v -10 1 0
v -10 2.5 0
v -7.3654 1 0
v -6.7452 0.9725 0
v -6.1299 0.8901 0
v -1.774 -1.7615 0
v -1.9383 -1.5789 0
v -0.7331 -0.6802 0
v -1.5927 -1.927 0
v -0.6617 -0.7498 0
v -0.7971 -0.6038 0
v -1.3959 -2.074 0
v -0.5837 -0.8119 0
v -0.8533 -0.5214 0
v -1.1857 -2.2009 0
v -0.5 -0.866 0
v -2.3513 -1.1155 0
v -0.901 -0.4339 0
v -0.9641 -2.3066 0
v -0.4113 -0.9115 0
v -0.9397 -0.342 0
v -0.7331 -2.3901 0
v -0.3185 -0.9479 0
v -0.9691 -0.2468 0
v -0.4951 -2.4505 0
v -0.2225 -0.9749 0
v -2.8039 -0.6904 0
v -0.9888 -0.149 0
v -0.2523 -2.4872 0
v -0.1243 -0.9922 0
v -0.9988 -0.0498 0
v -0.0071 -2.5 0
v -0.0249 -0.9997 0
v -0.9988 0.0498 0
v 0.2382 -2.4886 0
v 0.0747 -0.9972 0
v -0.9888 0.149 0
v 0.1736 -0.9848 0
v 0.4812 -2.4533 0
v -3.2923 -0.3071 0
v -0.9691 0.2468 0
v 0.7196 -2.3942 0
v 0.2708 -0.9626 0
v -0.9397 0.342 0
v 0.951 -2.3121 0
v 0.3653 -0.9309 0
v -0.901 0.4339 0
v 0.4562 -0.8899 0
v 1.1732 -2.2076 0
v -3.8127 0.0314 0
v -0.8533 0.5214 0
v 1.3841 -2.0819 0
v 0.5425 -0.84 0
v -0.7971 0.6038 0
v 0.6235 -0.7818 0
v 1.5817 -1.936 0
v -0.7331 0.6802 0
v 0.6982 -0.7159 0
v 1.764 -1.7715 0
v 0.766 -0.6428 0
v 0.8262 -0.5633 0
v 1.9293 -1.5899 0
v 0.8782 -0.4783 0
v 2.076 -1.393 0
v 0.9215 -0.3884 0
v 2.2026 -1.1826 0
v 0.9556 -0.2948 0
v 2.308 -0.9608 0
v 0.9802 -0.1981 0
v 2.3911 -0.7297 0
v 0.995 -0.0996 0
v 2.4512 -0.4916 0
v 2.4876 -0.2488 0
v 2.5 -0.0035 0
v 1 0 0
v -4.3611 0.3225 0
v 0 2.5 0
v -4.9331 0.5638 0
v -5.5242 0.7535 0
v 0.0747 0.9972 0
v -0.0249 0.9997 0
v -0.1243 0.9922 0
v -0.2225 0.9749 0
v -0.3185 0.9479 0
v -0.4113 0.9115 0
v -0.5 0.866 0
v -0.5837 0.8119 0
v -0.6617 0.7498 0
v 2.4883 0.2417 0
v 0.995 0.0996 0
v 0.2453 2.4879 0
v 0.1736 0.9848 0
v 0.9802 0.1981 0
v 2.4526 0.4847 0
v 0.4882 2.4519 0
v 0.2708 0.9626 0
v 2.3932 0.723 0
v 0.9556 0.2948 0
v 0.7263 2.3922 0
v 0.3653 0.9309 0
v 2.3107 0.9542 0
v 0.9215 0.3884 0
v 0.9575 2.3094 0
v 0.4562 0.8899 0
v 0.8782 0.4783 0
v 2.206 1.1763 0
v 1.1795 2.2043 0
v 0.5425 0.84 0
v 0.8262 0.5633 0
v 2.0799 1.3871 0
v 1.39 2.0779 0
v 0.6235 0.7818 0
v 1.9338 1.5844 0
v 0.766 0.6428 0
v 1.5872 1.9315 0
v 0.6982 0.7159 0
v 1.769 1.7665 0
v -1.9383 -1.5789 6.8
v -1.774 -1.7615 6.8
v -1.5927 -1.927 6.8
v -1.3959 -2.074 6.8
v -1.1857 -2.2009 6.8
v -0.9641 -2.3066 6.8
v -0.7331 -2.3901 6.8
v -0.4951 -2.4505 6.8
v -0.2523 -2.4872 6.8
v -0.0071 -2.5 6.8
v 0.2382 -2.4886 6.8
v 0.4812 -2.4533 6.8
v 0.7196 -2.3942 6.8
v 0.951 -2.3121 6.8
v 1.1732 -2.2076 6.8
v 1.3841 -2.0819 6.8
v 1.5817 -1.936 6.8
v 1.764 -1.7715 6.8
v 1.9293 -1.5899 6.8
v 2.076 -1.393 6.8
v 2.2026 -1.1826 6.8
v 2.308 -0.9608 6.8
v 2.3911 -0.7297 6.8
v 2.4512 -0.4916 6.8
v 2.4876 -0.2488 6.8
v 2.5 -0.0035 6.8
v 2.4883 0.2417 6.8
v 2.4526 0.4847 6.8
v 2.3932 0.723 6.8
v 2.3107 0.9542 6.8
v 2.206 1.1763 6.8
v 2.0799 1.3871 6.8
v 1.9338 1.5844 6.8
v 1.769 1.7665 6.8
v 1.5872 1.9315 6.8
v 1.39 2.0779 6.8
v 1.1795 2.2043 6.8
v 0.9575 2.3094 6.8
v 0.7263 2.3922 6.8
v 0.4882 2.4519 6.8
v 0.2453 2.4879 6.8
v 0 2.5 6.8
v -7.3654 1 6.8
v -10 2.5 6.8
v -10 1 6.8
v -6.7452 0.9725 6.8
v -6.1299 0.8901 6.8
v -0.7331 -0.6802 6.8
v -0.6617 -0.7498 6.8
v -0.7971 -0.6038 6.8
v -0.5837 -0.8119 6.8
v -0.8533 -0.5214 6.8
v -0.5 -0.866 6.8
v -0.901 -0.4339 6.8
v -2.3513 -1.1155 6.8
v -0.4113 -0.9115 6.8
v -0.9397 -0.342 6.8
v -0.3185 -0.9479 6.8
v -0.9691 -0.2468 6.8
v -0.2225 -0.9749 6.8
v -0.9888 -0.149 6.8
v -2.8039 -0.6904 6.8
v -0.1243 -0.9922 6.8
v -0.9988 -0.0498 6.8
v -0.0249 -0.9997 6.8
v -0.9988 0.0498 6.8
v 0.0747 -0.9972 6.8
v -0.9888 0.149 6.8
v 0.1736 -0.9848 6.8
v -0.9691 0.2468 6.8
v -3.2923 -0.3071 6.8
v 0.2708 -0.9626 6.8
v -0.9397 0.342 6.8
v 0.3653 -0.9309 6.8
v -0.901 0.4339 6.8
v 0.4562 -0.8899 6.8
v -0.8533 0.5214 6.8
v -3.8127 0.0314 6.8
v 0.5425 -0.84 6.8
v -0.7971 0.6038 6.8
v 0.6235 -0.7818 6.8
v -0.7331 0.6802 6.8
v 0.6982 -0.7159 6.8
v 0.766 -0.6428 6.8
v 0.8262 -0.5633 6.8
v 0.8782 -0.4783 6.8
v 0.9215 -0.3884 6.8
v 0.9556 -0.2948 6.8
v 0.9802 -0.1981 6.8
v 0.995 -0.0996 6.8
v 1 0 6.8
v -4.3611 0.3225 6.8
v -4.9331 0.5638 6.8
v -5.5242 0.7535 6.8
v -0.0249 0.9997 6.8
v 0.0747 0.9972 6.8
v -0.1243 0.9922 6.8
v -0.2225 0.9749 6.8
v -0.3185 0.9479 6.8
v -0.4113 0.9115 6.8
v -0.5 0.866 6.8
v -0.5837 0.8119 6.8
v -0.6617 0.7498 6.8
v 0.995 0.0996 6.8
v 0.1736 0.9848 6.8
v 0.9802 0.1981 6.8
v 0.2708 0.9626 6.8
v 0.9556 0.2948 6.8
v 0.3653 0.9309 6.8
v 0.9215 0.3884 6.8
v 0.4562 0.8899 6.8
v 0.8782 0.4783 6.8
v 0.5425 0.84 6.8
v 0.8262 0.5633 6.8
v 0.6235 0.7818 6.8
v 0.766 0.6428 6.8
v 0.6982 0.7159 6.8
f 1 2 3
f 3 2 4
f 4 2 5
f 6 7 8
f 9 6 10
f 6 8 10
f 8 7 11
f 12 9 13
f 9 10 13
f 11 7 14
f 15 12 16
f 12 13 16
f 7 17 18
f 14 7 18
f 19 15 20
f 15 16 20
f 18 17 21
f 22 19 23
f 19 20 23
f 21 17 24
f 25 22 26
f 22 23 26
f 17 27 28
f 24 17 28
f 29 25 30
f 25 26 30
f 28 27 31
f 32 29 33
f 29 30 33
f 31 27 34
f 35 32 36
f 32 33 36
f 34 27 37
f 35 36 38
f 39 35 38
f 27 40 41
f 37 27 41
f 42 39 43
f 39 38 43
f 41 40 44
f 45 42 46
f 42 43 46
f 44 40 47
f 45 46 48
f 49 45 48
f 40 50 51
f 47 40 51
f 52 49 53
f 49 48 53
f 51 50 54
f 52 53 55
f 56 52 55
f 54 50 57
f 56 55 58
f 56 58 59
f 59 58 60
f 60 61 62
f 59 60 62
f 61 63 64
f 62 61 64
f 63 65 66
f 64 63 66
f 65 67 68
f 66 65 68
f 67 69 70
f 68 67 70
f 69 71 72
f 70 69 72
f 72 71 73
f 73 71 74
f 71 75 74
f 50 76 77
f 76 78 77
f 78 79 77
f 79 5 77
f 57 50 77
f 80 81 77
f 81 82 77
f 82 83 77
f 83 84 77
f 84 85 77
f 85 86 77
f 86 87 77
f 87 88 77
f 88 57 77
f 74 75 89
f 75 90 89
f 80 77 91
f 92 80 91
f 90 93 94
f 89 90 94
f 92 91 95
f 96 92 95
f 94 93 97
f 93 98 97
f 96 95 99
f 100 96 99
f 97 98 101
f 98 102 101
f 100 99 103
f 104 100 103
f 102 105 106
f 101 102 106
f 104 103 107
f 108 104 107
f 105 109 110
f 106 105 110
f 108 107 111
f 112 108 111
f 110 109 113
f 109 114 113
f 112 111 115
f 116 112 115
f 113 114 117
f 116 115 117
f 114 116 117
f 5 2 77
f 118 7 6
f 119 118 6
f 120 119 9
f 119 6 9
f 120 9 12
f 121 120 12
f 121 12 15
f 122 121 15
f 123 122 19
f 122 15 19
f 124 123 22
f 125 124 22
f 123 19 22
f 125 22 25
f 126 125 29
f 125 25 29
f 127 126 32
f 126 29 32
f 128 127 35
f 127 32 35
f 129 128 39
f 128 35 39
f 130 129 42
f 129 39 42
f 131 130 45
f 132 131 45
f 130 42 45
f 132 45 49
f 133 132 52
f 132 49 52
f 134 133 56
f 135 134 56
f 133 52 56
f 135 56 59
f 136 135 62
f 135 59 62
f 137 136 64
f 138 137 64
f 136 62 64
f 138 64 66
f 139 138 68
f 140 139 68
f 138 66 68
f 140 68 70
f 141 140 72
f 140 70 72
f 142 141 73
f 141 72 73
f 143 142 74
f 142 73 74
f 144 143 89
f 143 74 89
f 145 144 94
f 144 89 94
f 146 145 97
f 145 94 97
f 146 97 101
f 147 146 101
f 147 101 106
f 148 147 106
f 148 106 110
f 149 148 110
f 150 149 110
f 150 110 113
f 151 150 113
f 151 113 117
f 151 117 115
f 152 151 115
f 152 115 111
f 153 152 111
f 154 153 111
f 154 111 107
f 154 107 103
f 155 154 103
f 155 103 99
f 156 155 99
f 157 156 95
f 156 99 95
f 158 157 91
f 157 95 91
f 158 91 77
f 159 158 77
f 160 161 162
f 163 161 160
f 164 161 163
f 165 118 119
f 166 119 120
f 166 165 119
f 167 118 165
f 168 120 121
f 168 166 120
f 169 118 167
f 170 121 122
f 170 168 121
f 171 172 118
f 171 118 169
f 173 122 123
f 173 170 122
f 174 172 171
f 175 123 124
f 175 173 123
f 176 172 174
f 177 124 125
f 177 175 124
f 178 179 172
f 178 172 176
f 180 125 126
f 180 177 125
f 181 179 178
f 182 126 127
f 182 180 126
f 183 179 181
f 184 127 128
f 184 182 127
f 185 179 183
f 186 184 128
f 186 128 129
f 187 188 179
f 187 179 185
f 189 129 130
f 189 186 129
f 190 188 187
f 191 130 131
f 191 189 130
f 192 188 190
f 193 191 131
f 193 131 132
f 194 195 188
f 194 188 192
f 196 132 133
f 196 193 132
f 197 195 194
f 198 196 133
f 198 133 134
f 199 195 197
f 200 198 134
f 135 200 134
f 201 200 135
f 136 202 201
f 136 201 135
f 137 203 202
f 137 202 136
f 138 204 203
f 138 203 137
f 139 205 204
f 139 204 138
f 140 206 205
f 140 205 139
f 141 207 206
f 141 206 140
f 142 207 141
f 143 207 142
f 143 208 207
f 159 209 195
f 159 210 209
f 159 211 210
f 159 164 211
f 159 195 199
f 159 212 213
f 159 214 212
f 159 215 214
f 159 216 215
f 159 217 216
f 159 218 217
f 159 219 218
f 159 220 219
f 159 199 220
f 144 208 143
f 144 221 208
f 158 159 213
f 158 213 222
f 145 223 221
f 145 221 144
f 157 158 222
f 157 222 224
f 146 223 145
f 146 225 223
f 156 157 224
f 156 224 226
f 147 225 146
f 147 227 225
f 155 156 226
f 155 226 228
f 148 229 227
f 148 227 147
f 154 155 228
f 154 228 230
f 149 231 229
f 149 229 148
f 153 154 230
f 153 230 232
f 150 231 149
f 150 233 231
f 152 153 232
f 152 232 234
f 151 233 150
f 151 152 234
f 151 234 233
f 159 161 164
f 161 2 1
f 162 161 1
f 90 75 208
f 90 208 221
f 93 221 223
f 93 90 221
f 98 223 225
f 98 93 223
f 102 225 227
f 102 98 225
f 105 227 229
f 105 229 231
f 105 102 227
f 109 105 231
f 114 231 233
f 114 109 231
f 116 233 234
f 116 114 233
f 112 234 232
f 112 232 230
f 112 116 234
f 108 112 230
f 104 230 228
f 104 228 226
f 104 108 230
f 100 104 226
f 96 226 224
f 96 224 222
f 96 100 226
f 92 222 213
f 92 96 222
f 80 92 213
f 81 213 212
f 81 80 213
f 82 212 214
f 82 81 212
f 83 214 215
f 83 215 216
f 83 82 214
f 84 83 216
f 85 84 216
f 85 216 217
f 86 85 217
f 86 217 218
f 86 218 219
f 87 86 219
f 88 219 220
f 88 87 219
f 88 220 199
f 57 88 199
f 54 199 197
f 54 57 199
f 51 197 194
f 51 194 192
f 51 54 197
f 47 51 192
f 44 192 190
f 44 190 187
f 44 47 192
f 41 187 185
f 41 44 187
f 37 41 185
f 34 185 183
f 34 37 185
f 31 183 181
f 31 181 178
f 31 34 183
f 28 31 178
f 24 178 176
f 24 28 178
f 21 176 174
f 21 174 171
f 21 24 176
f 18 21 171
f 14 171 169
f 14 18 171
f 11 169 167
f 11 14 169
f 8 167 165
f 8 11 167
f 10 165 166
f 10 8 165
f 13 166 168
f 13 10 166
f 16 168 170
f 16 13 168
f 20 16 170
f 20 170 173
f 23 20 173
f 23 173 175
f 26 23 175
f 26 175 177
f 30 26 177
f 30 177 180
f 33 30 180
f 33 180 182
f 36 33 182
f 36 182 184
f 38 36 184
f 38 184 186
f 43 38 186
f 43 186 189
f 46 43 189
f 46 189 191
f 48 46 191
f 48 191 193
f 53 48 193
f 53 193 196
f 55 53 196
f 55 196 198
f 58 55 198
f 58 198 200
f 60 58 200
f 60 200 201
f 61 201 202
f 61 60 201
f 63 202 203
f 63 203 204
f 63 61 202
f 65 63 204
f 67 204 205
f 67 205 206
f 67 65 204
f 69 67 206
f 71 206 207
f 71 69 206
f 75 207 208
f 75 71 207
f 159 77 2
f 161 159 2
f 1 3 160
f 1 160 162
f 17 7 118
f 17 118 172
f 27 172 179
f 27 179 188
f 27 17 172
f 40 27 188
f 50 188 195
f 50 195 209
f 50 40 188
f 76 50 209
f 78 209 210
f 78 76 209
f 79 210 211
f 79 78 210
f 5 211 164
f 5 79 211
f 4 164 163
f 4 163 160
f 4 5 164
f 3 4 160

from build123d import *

# Parameters (mm, degrees)
SKETCH_R  = 1
PAD_DEPTH = 6.8


with BuildPart() as part:
    # Sketch → Pad (new body)
    with BuildSketch(Plane.XY):
        with BuildLine():
            Line((0, 2.5), (-10, 2.5))
            Line((-10, 2.5), (-10, 1))
            Line((-7.365431, 1), (-10, 1))
            ThreePointArc((-1.938281, -1.578944), (-4.361066, 0.322469), (-7.365431, 1))
            ThreePointArc((-1.938281, -1.578944), (2.258026, -1.072996), (0, 2.5))
        make_face()
        Circle(SKETCH_R, mode=Mode.SUBTRACT)
    extrude(amount=PAD_DEPTH)


solid = part.part
